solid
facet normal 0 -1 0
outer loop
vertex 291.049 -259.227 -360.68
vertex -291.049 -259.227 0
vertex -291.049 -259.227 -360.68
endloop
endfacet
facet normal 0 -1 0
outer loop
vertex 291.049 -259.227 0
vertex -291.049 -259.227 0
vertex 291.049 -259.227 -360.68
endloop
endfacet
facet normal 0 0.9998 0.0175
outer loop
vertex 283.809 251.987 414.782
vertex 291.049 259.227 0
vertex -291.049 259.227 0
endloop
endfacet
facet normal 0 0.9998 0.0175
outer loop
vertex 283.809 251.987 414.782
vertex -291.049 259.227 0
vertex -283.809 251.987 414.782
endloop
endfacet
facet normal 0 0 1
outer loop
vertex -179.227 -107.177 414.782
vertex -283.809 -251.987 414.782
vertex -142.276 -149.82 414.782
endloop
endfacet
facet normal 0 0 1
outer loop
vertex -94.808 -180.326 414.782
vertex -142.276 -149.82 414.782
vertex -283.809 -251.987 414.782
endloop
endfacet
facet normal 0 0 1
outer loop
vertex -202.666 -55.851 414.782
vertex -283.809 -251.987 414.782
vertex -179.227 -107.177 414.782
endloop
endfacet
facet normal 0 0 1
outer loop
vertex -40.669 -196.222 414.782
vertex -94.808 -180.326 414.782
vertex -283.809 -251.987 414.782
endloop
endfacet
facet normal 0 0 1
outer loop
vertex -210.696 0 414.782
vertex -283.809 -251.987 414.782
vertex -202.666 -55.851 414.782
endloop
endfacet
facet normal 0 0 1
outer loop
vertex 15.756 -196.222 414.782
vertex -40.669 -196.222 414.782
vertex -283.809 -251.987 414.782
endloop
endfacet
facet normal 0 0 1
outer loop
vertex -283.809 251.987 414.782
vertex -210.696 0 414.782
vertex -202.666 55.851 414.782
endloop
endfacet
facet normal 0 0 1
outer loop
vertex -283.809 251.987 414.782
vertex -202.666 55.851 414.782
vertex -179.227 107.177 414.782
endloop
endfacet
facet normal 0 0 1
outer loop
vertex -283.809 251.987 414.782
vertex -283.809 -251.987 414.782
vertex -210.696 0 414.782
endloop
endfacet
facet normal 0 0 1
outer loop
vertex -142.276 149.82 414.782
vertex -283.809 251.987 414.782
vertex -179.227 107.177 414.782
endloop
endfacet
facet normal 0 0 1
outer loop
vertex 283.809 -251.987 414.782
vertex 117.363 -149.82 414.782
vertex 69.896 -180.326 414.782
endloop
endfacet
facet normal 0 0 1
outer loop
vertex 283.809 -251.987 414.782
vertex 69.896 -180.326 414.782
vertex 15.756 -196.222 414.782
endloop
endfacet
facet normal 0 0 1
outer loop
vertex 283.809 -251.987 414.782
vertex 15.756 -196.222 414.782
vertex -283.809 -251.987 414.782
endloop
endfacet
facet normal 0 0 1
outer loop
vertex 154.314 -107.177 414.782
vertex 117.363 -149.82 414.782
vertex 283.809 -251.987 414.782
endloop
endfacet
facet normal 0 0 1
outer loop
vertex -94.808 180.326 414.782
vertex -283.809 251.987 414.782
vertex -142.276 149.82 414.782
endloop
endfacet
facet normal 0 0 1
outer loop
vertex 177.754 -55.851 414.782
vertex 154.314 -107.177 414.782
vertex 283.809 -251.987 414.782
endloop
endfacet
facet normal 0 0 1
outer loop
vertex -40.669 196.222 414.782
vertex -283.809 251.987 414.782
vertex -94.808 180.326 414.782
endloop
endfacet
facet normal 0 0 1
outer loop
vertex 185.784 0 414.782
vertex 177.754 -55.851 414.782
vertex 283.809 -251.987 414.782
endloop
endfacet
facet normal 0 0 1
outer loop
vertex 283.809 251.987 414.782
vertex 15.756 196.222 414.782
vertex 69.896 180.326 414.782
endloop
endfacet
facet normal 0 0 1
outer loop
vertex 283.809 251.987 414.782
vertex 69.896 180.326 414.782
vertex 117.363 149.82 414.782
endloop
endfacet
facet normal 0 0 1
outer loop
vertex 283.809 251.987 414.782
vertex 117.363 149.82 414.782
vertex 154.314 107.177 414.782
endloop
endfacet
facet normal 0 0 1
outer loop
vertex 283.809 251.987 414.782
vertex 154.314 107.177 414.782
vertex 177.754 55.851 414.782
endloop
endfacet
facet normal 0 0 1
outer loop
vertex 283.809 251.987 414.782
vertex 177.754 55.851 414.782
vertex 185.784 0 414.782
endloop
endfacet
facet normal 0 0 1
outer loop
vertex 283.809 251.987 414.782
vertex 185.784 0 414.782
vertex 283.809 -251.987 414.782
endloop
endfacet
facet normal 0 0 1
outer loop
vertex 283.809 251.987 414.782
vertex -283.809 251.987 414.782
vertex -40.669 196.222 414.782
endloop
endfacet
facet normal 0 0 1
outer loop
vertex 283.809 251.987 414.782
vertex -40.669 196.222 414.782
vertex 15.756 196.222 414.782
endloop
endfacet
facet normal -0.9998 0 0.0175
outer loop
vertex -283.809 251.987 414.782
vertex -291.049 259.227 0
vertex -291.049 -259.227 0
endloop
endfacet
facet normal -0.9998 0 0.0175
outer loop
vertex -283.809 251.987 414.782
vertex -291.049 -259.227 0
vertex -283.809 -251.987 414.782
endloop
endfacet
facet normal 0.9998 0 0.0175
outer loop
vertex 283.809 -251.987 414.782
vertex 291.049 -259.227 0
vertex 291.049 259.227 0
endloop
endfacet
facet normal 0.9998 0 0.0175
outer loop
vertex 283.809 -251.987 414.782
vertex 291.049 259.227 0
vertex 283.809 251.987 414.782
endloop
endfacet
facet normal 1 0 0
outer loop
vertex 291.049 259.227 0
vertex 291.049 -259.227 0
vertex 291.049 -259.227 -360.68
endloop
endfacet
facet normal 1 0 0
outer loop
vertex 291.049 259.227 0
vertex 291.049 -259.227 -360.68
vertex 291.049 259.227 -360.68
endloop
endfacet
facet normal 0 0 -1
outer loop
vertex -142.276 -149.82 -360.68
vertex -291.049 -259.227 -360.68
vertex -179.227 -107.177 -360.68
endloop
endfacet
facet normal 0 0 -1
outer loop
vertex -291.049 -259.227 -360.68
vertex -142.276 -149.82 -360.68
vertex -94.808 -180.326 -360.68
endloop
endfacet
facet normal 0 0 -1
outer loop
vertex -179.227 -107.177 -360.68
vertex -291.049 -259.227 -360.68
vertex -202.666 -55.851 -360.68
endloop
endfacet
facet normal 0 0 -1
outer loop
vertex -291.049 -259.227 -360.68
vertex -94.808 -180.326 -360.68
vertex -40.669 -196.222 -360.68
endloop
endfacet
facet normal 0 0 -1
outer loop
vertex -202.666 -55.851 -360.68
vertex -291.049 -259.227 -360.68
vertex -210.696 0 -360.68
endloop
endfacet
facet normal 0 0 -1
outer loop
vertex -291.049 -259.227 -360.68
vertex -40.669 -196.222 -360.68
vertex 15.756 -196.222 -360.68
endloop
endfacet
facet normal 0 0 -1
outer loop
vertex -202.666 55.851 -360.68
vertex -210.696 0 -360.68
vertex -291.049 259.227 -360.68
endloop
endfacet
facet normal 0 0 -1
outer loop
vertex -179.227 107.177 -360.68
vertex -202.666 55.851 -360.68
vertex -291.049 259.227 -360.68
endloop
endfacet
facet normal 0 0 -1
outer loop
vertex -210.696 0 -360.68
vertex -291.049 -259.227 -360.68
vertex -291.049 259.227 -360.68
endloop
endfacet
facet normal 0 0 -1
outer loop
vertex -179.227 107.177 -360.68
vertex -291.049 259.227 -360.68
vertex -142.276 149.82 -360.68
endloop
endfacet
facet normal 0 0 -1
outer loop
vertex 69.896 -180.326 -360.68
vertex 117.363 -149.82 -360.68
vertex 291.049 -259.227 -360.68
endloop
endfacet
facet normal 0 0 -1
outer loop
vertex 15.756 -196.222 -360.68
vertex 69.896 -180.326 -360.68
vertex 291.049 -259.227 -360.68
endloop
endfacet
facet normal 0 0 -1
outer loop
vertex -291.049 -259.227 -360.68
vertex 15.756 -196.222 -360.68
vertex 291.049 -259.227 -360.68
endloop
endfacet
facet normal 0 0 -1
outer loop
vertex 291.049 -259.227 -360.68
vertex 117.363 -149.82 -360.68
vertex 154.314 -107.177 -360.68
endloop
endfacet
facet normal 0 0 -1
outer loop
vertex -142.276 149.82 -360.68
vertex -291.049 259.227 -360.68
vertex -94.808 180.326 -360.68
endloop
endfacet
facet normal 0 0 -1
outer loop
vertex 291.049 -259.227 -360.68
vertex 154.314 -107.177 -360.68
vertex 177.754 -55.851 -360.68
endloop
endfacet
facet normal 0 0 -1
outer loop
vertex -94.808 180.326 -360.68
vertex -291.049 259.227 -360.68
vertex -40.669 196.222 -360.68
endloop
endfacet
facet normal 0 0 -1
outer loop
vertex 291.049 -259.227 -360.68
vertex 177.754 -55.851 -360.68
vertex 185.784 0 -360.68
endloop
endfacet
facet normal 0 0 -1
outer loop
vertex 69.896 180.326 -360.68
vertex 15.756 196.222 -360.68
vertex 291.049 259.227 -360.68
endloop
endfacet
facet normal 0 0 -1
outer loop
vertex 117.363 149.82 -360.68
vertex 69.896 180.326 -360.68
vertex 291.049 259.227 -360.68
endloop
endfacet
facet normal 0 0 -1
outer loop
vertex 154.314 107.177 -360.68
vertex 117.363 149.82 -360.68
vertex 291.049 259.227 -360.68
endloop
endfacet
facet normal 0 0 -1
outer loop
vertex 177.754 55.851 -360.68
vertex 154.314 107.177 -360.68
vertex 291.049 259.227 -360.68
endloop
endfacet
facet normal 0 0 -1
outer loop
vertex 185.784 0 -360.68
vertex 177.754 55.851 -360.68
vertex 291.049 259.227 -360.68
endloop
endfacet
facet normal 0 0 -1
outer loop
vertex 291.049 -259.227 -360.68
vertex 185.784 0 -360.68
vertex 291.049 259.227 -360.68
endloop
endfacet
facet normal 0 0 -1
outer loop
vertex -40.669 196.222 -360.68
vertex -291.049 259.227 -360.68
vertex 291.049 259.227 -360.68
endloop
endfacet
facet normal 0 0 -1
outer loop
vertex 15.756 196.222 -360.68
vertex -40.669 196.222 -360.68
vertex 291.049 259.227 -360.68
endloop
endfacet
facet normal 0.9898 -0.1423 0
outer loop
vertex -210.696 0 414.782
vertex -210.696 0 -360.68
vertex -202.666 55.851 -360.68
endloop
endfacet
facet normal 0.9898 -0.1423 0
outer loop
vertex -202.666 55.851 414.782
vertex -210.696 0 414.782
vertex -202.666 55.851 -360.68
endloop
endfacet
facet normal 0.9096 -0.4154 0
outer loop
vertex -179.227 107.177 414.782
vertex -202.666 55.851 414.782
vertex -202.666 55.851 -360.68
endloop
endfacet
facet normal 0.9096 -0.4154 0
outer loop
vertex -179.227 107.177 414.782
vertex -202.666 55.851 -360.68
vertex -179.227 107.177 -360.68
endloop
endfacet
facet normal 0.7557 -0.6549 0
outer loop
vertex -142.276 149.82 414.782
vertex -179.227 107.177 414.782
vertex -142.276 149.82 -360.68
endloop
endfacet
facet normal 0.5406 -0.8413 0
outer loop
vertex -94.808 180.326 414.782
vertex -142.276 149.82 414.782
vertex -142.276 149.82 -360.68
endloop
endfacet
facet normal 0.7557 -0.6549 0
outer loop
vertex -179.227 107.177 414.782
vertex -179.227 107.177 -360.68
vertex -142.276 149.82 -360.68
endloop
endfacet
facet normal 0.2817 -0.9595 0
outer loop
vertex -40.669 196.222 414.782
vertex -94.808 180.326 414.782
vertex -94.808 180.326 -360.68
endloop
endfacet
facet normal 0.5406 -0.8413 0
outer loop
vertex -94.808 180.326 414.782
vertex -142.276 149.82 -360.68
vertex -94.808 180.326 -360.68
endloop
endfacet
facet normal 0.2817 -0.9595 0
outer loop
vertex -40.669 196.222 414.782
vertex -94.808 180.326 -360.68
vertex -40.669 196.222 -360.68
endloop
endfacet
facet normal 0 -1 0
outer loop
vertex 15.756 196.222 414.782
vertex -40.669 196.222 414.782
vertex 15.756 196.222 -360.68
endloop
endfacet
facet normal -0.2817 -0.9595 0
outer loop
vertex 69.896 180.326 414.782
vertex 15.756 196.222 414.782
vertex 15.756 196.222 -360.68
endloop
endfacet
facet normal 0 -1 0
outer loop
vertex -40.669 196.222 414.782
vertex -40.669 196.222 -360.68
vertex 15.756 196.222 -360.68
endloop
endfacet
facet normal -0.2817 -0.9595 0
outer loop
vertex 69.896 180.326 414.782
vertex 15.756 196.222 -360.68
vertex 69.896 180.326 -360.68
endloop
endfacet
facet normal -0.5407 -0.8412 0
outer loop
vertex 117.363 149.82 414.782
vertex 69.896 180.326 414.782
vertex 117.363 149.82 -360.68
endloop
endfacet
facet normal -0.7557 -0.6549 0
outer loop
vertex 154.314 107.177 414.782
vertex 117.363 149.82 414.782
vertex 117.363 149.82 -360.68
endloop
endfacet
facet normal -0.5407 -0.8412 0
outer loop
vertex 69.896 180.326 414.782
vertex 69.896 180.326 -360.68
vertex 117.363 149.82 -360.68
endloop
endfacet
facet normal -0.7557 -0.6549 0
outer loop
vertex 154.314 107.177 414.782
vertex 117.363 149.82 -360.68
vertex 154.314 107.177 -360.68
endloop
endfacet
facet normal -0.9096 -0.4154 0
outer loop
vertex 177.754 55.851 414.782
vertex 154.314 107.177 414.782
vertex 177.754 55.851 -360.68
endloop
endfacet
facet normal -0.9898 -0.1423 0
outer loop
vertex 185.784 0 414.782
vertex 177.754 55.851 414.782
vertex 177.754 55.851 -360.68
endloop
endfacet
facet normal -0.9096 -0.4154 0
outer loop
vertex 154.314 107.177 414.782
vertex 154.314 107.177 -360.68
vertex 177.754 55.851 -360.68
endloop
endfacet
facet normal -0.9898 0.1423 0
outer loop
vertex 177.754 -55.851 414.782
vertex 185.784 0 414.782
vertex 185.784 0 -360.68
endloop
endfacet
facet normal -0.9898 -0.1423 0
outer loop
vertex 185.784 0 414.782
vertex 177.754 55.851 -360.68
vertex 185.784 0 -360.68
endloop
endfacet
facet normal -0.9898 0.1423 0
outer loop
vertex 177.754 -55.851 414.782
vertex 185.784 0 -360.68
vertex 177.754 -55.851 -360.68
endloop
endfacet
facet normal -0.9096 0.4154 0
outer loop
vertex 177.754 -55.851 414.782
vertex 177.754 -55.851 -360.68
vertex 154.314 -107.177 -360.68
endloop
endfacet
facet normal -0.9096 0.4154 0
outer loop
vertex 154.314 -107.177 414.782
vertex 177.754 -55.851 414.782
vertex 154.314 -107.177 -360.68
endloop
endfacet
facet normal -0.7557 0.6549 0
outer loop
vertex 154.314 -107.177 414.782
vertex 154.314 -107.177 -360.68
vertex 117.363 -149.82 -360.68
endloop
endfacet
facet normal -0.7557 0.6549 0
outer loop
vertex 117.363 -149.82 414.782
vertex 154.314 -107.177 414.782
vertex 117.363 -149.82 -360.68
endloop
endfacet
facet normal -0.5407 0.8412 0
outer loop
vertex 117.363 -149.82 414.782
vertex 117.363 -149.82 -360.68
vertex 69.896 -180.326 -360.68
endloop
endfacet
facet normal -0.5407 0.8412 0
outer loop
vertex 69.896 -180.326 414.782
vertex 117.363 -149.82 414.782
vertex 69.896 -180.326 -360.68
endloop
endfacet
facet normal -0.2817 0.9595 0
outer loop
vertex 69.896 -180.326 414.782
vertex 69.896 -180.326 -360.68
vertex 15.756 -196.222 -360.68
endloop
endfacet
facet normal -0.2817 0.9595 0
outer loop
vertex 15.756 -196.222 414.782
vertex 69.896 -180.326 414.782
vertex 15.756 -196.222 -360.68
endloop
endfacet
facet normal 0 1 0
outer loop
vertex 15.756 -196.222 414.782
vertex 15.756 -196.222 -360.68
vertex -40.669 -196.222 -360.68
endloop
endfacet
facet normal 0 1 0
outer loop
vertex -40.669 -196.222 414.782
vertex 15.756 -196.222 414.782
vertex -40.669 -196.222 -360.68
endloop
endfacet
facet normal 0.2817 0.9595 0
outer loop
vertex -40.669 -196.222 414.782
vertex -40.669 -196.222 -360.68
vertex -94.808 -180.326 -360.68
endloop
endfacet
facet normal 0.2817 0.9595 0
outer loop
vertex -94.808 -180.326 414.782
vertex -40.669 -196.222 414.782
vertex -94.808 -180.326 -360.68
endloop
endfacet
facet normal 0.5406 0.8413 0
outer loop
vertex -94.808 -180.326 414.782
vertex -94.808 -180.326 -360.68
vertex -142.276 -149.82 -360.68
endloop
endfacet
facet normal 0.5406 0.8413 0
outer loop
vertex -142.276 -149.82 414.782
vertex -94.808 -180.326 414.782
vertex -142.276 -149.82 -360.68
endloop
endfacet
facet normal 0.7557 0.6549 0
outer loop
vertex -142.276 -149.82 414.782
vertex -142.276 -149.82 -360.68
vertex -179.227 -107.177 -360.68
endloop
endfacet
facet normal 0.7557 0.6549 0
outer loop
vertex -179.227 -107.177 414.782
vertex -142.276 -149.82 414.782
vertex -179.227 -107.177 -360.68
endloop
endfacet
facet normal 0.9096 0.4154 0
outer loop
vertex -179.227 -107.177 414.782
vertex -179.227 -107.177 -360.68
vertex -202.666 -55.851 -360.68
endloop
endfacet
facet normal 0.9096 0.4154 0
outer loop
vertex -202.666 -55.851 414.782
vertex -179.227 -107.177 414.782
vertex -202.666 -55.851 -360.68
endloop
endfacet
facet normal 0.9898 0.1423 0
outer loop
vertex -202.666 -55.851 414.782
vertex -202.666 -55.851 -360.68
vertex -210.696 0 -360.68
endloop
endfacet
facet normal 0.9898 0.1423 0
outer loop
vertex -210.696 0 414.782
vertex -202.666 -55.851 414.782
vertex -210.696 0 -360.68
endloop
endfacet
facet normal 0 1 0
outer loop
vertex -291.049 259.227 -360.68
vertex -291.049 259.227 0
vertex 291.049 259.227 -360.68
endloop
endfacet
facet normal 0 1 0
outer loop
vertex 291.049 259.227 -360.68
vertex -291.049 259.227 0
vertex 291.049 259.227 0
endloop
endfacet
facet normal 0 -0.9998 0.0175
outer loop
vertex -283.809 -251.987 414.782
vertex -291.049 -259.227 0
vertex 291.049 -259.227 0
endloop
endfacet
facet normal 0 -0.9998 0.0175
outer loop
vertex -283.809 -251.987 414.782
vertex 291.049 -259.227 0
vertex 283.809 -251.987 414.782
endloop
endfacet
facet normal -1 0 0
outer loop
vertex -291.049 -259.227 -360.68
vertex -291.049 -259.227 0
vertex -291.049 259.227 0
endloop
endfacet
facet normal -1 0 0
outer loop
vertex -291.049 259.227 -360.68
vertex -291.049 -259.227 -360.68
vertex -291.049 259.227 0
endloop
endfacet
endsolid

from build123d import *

# Parameters (mm, degrees)
SKETCH1_W                     = 582.097428288
SKETCH1_H                     = 518.453658302
BOSS_EXTRUDE1_DEPTH           = 414.782
BOSS_EXTRUDE1_TAPER           = 1
BOSS_EXTRUDE1_OTHER_WAY_DEPTH = 360.68
SKETCH2_R                     = 198.240238767
CUT_EXTRUDE1_DEPTH            = 868.899312363


with BuildPart() as part:
    # Sketch1 → Boss-Extrude1 (new body)
    with BuildSketch(Plane.XY):
        Rectangle(SKETCH1_W, SKETCH1_H)
    extrude(amount=BOSS_EXTRUDE1_DEPTH, taper=BOSS_EXTRUDE1_TAPER)

    # Sketch1 → Boss-Extrude1 other way (add)
    with BuildSketch(Plane.XY):
        Rectangle(SKETCH1_W, SKETCH1_H)
    extrude(amount=-BOSS_EXTRUDE1_OTHER_WAY_DEPTH)

    # Sketch2 → Cut-Extrude1 (cut, through all)
    with BuildSketch(Plane(origin=(0, 0, -360.68), x_dir=(-1, 0, 0), z_dir=(0, 0, -1))):
        with Locations((12.456248264, 0)):
            Circle(SKETCH2_R)
    extrude(amount=-CUT_EXTRUDE1_DEPTH, mode=Mode.SUBTRACT)


solid = part.part
